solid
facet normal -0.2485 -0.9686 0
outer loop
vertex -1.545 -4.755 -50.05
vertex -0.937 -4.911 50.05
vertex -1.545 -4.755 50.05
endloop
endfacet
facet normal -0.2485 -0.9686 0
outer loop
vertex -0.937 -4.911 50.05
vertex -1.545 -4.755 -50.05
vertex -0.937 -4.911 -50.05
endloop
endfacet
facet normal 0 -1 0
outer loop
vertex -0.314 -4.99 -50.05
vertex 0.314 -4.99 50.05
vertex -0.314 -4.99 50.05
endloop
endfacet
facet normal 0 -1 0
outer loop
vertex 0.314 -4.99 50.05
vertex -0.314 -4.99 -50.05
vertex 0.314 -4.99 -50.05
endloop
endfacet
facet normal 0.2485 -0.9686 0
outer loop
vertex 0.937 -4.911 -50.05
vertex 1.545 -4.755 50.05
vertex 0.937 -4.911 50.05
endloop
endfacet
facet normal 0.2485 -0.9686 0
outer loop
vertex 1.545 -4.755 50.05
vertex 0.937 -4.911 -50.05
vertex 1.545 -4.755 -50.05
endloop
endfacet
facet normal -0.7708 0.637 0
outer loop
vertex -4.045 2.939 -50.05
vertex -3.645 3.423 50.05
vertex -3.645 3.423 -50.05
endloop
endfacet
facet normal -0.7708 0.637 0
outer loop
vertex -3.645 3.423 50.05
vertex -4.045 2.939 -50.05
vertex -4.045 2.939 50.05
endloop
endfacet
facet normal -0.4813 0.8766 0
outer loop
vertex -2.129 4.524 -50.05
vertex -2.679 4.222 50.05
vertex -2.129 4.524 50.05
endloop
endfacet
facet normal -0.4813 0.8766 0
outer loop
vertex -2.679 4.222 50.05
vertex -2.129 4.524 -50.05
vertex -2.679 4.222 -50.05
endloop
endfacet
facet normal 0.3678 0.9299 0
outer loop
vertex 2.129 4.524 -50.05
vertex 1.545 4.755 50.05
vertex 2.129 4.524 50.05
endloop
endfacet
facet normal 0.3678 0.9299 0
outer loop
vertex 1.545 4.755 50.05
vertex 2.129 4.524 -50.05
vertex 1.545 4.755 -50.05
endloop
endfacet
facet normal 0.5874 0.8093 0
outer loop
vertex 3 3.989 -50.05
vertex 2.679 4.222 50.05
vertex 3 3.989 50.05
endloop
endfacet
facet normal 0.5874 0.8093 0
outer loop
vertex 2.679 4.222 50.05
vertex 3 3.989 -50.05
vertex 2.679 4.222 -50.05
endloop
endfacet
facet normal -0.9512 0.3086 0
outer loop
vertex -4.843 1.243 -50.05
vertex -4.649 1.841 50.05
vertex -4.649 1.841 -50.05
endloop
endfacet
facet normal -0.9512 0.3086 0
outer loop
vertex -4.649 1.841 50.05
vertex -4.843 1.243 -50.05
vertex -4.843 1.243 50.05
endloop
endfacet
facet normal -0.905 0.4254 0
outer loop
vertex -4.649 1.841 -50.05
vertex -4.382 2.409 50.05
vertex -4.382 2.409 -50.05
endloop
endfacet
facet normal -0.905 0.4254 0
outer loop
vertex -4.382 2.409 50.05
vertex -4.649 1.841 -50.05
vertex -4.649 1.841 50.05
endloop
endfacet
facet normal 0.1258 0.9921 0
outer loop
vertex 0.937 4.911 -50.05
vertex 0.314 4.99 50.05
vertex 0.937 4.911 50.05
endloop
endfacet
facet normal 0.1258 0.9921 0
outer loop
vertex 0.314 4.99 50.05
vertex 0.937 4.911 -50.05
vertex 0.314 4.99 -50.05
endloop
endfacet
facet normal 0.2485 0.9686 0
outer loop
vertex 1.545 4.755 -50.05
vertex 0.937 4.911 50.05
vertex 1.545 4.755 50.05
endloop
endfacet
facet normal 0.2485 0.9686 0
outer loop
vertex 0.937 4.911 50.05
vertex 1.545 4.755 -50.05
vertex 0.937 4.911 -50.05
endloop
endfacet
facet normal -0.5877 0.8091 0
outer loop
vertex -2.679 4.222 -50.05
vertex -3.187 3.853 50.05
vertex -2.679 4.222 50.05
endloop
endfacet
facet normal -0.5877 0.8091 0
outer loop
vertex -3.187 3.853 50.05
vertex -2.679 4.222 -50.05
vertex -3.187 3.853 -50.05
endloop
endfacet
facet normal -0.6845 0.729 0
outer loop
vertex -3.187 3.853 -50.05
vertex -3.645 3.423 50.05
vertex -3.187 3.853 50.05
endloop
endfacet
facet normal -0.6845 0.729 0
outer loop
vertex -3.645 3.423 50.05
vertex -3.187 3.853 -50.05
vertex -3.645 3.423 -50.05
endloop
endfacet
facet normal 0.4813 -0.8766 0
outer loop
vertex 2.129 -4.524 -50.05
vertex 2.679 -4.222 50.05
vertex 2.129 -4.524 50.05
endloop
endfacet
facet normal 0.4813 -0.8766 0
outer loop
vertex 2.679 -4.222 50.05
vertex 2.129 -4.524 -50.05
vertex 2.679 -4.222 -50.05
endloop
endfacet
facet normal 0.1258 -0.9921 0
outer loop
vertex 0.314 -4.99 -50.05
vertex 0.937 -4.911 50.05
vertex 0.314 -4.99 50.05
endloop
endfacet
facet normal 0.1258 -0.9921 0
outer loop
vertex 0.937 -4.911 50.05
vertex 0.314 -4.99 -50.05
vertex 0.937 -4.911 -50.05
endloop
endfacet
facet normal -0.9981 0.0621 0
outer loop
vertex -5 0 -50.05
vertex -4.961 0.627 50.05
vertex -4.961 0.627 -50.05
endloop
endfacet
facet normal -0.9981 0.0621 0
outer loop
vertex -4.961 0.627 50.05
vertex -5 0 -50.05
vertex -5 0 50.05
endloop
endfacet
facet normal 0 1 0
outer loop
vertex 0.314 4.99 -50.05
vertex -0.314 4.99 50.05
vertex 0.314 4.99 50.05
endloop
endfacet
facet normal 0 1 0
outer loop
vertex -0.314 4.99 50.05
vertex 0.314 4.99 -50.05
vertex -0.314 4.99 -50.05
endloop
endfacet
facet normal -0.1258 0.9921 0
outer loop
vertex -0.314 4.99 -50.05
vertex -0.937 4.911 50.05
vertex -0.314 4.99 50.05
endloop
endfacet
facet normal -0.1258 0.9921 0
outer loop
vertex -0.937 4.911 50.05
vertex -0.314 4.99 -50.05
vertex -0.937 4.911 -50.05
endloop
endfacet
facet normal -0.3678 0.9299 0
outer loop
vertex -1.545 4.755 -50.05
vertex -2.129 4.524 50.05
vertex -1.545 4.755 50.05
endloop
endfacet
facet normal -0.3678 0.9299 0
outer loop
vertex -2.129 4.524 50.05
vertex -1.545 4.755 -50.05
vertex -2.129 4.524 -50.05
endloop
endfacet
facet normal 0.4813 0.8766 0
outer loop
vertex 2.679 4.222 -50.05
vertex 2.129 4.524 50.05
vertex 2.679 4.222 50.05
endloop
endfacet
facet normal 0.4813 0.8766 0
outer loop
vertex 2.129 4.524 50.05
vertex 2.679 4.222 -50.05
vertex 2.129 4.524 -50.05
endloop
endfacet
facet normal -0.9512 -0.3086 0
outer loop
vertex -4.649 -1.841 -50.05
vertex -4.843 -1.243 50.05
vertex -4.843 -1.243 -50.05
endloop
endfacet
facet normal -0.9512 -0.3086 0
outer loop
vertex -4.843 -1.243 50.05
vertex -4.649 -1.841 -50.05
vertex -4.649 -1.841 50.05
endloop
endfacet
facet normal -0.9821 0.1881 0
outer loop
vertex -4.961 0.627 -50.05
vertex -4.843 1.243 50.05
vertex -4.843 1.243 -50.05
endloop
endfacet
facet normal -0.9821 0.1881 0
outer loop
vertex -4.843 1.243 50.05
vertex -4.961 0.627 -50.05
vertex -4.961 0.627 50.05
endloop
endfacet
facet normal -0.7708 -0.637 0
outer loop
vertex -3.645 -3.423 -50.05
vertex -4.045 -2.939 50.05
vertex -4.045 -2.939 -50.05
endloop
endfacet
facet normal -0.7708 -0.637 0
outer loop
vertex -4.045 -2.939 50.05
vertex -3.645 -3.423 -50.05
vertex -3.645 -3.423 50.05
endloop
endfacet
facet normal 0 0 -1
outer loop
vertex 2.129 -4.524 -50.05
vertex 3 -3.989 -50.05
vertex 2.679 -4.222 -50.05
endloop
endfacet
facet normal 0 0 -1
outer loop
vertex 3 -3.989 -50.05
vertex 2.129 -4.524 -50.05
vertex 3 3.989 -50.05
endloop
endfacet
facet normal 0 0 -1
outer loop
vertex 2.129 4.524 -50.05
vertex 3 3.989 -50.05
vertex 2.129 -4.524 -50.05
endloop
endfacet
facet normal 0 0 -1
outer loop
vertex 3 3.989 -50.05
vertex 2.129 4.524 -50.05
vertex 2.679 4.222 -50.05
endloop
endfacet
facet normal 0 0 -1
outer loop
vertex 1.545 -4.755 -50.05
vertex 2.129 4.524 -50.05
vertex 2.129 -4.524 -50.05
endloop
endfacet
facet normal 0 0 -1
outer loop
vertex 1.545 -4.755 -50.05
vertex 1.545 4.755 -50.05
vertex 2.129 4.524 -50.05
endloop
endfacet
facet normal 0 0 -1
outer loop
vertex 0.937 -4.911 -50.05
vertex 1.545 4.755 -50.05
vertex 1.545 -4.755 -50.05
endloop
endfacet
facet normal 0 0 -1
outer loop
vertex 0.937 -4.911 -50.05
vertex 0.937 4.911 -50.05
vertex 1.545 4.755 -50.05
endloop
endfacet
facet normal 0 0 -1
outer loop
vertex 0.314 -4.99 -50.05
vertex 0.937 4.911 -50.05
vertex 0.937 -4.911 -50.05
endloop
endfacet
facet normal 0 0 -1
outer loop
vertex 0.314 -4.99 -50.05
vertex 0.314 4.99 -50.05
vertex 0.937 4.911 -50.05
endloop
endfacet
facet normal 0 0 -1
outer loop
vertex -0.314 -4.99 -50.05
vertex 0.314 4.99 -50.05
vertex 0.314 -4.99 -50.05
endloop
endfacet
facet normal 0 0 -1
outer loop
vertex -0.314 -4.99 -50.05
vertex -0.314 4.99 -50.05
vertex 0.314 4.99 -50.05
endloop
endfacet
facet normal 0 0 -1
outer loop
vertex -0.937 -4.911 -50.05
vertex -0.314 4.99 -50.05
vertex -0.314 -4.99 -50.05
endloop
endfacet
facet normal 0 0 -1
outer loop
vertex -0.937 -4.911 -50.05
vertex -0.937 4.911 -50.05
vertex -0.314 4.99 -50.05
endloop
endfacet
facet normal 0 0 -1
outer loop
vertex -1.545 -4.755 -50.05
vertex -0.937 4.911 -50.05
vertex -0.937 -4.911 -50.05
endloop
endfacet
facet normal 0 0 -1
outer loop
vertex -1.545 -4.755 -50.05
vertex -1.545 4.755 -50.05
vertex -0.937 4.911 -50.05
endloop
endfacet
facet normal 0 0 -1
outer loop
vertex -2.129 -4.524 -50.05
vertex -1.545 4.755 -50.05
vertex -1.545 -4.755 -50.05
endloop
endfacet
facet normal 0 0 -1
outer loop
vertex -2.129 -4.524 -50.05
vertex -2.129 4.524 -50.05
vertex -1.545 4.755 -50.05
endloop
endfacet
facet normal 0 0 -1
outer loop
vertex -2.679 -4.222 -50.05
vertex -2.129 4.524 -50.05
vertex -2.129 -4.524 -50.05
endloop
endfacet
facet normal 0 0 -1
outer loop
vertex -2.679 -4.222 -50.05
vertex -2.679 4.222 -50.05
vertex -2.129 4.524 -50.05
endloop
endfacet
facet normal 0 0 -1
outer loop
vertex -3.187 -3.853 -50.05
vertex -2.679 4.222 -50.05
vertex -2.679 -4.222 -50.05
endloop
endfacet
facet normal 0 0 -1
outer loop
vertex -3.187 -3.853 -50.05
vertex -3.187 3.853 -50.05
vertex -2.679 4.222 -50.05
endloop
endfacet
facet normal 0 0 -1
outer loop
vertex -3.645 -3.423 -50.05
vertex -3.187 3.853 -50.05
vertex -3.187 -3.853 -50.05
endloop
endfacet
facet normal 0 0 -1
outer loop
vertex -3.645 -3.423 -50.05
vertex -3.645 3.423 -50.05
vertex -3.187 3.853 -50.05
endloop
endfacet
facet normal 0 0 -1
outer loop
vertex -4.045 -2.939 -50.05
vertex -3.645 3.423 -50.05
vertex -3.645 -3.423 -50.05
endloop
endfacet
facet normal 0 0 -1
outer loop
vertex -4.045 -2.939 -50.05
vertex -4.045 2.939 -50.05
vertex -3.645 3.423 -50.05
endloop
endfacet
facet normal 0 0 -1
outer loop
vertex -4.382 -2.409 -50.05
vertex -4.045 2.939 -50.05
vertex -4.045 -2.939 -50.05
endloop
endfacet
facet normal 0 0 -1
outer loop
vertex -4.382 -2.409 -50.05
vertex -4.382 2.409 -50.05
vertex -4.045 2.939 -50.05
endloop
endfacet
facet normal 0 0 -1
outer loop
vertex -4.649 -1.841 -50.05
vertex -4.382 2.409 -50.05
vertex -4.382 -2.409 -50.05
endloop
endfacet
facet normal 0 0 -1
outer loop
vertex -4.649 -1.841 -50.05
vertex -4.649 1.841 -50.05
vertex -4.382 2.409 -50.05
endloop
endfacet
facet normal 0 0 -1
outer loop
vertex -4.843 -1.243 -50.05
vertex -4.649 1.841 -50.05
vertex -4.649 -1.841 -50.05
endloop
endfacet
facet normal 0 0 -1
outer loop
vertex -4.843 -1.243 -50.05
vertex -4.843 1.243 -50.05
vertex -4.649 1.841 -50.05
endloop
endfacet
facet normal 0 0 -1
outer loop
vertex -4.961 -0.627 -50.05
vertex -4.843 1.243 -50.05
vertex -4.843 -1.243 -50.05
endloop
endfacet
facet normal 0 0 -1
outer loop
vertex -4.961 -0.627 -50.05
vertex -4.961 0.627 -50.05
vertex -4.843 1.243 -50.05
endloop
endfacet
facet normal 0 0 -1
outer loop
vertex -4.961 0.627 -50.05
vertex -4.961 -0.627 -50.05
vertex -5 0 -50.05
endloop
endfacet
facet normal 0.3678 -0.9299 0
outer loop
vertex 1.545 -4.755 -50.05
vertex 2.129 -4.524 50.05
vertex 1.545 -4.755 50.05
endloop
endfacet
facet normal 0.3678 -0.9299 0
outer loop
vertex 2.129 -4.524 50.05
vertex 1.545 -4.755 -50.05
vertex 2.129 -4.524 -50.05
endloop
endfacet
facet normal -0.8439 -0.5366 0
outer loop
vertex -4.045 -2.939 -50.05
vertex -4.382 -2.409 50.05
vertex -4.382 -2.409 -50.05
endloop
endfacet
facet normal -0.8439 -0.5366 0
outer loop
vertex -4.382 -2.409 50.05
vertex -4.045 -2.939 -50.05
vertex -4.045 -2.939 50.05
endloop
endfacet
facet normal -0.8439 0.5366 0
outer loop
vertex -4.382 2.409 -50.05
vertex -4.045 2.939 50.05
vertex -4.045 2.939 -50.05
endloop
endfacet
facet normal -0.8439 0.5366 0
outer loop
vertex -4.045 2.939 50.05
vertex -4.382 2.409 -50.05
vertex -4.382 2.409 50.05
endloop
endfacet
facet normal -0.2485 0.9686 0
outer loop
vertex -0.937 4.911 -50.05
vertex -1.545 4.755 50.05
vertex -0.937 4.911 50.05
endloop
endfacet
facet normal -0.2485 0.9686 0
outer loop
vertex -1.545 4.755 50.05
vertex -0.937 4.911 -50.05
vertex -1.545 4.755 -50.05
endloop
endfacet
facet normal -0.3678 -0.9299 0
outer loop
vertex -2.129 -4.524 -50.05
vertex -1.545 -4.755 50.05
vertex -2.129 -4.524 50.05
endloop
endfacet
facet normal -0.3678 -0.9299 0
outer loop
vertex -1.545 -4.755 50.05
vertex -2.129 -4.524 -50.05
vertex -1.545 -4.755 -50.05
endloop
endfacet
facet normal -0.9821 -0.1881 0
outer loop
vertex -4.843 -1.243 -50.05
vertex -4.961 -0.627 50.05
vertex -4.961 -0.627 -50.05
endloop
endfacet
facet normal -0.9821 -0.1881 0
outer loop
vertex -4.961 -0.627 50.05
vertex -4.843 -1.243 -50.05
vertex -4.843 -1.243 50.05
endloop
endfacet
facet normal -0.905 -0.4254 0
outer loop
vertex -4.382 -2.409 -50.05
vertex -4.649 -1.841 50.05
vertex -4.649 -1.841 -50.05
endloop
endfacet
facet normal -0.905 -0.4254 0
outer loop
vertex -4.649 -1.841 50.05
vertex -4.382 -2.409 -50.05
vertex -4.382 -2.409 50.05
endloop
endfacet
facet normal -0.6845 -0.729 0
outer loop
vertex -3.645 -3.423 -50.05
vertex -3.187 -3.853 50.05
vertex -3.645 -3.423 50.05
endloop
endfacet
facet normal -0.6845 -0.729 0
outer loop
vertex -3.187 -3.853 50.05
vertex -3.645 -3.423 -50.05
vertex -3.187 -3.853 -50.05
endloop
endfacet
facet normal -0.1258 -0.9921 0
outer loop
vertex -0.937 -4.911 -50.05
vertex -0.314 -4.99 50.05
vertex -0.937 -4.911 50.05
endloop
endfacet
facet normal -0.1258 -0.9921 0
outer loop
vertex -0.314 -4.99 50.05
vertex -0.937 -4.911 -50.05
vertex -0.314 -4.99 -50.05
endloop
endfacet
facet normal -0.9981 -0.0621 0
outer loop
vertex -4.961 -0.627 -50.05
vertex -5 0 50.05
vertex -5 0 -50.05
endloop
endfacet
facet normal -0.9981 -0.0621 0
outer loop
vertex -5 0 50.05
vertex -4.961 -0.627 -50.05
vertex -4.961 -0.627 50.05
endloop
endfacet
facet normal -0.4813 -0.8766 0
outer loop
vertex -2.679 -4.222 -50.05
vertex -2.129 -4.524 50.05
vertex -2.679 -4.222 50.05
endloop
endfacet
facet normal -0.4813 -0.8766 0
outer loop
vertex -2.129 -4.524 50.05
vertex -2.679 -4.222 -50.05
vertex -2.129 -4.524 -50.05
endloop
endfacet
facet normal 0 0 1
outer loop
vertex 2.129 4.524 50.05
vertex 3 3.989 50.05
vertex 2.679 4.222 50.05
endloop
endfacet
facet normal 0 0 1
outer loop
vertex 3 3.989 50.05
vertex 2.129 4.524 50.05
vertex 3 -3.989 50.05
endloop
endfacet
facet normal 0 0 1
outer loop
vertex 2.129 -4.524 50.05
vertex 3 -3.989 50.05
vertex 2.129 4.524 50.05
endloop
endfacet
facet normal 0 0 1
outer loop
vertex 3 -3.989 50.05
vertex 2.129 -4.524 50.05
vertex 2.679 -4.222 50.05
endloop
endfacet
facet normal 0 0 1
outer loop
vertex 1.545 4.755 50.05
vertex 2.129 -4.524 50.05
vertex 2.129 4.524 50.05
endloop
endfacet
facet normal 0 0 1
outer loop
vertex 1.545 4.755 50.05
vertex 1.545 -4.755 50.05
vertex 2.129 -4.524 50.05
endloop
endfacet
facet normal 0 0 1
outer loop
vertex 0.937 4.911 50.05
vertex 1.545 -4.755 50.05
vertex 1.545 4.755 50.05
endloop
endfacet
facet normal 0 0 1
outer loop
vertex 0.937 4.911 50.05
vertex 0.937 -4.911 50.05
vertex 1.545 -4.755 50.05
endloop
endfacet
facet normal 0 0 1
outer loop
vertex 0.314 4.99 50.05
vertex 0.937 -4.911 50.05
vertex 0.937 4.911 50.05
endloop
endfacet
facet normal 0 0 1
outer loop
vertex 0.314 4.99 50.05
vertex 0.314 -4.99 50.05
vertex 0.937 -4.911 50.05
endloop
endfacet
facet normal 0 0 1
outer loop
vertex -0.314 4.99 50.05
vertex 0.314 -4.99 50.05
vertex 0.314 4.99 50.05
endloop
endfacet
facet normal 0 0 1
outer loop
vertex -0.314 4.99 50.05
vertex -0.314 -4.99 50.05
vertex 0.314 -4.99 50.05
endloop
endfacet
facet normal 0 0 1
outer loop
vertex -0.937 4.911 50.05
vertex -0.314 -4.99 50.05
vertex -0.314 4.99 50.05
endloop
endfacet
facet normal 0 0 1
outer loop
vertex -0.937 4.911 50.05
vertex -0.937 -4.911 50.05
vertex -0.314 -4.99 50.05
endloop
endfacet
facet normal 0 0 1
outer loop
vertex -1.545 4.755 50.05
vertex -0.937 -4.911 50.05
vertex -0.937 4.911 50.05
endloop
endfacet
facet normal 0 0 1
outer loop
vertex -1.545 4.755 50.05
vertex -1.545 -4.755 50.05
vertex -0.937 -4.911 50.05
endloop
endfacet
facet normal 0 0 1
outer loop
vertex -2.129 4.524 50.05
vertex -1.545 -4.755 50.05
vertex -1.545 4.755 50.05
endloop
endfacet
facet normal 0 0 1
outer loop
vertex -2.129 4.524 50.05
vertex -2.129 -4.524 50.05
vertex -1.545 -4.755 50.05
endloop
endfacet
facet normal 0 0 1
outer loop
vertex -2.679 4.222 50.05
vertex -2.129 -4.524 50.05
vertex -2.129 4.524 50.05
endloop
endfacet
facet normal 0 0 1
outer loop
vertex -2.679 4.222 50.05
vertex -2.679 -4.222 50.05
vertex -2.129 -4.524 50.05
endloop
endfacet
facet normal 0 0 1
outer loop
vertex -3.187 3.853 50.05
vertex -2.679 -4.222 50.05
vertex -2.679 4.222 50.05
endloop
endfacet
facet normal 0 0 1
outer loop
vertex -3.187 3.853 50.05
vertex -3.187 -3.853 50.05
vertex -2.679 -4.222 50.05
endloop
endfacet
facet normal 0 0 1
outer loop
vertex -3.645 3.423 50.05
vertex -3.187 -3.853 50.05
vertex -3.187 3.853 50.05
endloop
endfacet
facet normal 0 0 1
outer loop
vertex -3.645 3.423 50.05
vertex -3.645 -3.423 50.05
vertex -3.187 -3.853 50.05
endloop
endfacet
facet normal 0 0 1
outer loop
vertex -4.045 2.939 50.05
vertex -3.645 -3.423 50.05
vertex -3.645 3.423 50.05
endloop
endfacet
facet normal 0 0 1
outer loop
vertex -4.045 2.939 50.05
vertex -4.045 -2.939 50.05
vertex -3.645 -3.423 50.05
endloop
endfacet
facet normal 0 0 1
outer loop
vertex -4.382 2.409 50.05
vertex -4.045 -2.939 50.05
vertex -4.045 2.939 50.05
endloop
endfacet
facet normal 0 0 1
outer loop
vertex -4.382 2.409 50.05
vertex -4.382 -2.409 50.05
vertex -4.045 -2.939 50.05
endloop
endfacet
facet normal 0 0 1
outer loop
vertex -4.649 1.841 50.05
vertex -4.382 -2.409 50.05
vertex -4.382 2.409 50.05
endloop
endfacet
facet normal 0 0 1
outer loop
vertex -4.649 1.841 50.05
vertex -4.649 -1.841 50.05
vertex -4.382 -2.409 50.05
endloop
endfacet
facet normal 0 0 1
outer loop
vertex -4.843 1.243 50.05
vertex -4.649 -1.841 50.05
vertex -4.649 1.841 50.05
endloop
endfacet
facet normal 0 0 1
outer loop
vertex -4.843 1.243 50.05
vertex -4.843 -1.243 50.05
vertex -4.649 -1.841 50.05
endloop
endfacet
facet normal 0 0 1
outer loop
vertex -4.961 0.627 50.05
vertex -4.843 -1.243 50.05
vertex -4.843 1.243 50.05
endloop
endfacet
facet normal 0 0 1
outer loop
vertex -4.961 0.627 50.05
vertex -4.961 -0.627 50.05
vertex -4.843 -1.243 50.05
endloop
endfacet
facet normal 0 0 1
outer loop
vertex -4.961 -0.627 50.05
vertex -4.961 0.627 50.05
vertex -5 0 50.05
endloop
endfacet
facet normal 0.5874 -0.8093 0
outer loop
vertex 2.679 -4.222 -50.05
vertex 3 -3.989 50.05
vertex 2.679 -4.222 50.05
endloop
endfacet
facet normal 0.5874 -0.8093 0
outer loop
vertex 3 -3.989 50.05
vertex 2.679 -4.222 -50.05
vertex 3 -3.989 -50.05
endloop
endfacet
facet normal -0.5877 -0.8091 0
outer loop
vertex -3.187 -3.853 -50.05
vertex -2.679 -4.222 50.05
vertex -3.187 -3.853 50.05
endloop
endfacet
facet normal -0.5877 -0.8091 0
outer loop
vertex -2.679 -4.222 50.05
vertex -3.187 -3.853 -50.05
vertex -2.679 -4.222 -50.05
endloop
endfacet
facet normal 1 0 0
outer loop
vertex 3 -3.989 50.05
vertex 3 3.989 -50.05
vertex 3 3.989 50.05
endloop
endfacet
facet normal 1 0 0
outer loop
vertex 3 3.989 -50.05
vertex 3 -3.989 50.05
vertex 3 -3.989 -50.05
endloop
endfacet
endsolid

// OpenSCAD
// Tachometer reflector surface for motor axel
// Designed to be printed in two colors.

// Main principle is a cylinder (tacho reflector) with cutouts from the axel and for mountings

// Variables

// The full diameter of the axel
axel_diameter = 10;
// The distance from the cutout flat side to the other side of the axel (the width of the "D")
axel_diameter_flat = 8;

// The outside diameter of the reflector cylinder
tacho_reflector_diameter = 30;
// Length of reflector
tacho_reflector_length = 100;

// Screw diameter
screw_diameter = 4;
// Screw head diameter -- also used for hex nut cutput
screw_head_diameter = 8;
// Screw cutout length. This should really be calculated...
screw_cutout_length = 20;

// Consts

// Space -- for making space around the screw
space = 0.25;
// Pad -- for padding stuff
pad = 0.05;
// Neato circles.
$fn = 50;


// Calculated values
axel_radius = axel_diameter / 2.0;
tacho_reflector_radius = tacho_reflector_diameter / 2.0;
screw_radius = screw_diameter / 2.0;
screw_head_radius = screw_head_diameter / 2.0;

// The axel is used to "cut out" the axel from the techo cylinder
module axel() {
    difference() {
        #cylinder(r = axel_radius, h = tacho_reflector_length + 2*pad, center = true);
        translate([axel_diameter_flat + pad,0,0]) {
            cube([2*axel_radius + 2*pad, 2*axel_radius + 2*pad, tacho_reflector_length + 4*pad], center = true);
        }
    }
}


axel();
